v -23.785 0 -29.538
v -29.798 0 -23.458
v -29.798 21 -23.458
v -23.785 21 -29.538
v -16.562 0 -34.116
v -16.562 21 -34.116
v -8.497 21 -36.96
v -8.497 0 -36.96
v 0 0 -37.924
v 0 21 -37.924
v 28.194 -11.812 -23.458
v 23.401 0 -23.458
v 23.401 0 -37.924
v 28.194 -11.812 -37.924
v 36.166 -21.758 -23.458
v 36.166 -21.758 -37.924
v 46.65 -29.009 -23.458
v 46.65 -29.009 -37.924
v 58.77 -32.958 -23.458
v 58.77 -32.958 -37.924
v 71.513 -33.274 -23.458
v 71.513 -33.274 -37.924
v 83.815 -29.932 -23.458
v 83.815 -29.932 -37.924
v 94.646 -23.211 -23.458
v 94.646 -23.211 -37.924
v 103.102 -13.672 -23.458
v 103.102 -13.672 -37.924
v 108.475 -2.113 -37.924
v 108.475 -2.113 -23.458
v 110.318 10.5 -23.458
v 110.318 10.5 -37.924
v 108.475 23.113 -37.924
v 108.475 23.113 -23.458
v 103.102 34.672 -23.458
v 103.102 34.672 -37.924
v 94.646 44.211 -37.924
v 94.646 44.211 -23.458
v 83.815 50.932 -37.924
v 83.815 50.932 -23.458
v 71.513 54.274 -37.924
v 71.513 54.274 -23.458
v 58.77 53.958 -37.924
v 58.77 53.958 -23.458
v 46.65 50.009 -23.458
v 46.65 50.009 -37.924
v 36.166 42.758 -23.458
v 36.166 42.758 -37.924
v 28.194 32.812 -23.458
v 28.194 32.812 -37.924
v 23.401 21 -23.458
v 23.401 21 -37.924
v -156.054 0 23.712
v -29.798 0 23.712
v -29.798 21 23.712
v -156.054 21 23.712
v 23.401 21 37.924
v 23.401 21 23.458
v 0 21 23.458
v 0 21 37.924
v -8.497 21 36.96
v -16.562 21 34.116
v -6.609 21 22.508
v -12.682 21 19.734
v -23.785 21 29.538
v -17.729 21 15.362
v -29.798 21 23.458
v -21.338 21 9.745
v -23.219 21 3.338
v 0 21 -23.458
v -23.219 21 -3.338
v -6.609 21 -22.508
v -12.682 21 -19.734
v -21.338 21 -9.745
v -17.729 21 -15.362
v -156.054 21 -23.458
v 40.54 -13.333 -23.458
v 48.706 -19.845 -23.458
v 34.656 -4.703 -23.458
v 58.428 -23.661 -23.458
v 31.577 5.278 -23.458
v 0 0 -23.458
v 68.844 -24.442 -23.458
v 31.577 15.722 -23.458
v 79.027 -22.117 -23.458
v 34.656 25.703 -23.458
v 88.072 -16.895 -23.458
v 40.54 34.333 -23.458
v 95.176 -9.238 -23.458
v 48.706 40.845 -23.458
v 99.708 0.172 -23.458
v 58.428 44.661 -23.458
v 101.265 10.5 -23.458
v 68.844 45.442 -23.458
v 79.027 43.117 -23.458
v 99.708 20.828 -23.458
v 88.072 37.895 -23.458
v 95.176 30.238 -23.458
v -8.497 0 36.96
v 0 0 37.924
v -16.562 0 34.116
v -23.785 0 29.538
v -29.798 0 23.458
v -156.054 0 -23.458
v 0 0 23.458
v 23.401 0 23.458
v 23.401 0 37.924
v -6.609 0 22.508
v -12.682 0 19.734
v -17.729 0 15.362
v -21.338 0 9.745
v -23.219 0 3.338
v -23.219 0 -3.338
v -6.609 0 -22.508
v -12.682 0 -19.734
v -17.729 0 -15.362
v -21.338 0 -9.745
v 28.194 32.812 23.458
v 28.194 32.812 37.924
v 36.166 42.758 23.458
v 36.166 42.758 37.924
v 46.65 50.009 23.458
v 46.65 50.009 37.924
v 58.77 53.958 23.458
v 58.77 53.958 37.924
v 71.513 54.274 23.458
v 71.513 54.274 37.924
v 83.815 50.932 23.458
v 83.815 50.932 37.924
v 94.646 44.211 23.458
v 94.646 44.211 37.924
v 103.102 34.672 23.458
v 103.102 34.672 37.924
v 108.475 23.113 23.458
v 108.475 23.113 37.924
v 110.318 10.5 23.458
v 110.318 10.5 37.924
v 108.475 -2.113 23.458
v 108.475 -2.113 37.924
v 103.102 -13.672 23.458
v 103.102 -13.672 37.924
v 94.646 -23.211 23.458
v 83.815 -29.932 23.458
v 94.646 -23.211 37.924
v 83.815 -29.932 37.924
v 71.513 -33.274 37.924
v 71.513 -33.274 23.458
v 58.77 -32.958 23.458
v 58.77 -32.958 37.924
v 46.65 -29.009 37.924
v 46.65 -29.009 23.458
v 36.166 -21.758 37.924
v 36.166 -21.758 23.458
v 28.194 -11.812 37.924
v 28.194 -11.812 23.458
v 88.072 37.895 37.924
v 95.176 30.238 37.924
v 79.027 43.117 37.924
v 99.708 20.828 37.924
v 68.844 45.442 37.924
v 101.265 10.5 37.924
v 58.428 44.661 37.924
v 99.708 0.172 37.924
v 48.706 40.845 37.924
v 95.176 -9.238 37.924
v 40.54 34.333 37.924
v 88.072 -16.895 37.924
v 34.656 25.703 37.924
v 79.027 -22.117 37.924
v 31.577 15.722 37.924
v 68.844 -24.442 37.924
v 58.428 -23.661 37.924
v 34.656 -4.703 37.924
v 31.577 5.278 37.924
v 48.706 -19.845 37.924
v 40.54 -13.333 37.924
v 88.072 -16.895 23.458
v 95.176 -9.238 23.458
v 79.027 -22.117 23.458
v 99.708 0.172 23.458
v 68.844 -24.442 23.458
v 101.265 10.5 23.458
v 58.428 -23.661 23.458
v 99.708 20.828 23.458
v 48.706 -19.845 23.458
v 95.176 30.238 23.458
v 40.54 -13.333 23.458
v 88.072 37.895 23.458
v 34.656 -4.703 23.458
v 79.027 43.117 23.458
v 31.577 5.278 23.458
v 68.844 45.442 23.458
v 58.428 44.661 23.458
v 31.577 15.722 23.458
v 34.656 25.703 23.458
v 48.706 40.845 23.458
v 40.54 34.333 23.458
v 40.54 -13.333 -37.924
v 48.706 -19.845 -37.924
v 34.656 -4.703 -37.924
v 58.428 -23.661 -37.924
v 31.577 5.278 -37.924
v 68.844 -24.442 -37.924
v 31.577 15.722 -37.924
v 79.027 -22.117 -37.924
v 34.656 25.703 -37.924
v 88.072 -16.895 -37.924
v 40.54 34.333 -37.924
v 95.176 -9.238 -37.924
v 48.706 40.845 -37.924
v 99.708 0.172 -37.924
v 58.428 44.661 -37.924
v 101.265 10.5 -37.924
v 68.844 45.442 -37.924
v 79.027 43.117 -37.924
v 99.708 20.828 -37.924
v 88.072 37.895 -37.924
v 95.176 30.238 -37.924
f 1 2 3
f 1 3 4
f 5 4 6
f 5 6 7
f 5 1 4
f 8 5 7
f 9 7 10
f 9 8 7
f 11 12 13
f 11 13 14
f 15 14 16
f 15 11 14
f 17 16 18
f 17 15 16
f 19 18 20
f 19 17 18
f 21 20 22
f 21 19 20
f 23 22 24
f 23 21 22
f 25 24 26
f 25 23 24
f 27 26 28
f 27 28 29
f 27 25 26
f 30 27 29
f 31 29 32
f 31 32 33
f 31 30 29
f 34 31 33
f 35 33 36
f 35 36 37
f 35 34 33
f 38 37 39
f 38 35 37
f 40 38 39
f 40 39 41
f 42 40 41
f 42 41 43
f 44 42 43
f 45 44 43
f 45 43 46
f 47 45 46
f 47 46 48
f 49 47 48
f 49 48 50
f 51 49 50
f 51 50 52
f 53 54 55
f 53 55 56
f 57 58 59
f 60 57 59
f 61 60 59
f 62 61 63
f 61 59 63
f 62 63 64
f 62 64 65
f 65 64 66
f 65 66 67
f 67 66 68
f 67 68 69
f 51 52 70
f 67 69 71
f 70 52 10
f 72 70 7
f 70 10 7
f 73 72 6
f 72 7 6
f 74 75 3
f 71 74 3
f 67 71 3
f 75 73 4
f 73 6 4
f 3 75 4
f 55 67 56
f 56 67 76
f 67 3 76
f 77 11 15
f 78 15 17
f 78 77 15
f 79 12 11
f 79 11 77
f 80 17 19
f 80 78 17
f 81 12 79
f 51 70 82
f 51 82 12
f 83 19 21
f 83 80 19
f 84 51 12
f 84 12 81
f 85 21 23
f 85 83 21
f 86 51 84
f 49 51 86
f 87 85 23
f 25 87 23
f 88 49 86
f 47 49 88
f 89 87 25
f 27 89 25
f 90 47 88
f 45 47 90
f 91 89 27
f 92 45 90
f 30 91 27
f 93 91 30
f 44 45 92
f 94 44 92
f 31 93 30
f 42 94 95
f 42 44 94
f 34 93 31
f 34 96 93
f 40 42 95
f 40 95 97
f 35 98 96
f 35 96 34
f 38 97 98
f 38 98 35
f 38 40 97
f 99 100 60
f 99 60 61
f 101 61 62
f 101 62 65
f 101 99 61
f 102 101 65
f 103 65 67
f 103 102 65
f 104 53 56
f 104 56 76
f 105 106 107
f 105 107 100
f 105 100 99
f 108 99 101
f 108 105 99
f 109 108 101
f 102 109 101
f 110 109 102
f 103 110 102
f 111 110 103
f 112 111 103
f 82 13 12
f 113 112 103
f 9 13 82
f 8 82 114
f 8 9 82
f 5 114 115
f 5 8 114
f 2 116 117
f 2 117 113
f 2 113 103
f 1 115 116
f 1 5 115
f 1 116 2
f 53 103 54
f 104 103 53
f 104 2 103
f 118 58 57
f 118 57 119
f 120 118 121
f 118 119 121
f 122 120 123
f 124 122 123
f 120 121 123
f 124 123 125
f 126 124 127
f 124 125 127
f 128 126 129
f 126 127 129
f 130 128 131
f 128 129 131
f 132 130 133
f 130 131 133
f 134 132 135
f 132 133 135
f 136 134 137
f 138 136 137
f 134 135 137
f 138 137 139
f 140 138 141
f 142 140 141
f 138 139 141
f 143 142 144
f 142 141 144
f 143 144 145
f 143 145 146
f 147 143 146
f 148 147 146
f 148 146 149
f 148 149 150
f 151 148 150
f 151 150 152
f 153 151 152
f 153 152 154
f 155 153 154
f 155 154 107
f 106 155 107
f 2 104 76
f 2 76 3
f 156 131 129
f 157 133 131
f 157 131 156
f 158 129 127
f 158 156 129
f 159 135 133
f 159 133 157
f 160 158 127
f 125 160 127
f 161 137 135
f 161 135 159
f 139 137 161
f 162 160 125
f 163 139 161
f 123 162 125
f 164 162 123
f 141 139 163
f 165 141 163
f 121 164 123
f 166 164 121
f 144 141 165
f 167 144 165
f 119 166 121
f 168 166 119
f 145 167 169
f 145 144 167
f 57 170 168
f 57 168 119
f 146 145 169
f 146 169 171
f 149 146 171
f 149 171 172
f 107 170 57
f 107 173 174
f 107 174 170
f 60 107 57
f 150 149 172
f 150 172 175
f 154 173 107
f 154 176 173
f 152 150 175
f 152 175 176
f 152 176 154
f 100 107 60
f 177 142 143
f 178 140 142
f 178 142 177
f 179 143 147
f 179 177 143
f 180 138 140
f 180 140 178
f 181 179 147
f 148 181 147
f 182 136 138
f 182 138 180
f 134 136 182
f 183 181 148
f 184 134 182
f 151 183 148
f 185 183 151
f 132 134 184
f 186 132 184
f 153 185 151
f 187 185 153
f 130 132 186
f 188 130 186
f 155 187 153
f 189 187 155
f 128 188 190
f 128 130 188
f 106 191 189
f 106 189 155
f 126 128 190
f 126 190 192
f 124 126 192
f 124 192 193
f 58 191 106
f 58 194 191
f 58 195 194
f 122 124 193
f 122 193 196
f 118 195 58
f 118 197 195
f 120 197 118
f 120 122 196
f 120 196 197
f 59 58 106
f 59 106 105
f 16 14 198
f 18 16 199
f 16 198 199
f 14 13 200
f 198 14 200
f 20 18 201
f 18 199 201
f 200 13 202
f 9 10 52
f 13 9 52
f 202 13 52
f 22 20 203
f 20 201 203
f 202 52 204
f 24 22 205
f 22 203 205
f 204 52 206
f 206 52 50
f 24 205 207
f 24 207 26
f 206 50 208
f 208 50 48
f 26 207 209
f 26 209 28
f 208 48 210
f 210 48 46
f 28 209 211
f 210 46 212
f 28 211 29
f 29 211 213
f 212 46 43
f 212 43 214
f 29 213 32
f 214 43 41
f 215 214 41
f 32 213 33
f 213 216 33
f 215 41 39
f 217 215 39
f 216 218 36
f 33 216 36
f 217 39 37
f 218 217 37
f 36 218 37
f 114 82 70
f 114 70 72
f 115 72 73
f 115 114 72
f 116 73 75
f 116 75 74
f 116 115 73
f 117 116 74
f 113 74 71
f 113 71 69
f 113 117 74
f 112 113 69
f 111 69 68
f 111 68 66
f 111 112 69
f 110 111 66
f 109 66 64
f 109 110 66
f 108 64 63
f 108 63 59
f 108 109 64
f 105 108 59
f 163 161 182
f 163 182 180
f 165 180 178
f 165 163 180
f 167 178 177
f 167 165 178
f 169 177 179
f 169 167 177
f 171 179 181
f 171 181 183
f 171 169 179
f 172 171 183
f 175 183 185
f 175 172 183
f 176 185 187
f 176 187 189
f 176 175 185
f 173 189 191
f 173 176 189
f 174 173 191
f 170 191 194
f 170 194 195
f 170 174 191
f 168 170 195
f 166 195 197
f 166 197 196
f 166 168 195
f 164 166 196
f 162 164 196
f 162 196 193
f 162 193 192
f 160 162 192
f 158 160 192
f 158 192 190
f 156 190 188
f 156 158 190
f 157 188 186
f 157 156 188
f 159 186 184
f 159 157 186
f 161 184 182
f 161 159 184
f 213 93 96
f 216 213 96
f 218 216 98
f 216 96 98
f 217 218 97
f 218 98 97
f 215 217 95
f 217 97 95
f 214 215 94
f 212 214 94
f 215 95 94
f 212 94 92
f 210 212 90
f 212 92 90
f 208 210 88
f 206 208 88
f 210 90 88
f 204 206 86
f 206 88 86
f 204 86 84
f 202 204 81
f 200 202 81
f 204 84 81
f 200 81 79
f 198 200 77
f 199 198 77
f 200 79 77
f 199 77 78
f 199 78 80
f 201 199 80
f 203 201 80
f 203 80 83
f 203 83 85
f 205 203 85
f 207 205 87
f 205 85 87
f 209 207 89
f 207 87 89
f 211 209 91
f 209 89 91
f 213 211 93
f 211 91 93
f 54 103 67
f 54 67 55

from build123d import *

# Parameters (mm, degrees)
BOSS_EXTRUDE1_DEPTH = 21
SKETCH2_R           = 44.092659675
SKETCH2_R_2         = 35.039506693
BOSS_EXTRUDE2_DEPTH = 14.465745569
BOSS_EXTRUDE3_START = -14.465745569
SKETCH4_R           = 44.092659675
SKETCH4_R_2         = 35.039506693
BOSS_EXTRUDE3_DEPTH = 14.465745569


with BuildPart() as part:
    # Sketch1 → Boss-Extrude1 (new body)
    with BuildSketch(Plane(origin=(0, 0, 0), x_dir=(1, 0, 0), z_dir=(0, 1, 0))):
        with BuildLine():
            Line((0, 37.924000209), (23.712323124, 37.924000209))
            Line((23.712323124, 37.924000209), (23.712323124, 23.45825464))
            Line((23.712323124, 23.45825464), (0, 23.45825464))
            ThreePointArc((0, 23.45825464), (-23.45825464, 0), (0, -23.45825464))
            Line((0, -23.45825464), (23.712323124, -23.45825464))
            Line((23.712323124, -23.45825464), (23.712323124, -37.924000209))
            Line((23.712323124, -37.924000209), (0, -37.924000209))
            ThreePointArc((0, -37.924000209), (-16.561988679, -34.116423067), (-29.798323461, -23.45825464))
            Line((-29.798323461, -23.45825464), (-29.798323461, -23.712323124))
            Line((-29.798323461, -23.712323124), (-156.054398777, -23.712323124))
            Line((-156.054398777, -23.712323124), (-156.054398777, 23.45825464))
            Line((-156.054398777, 23.45825464), (-29.798323461, 23.45825464))
            ThreePointArc((-29.798323461, 23.45825464), (-16.561988679, 34.116423067), (0, 37.924000209))
        make_face()
    extrude(amount=BOSS_EXTRUDE1_DEPTH)

    # Sketch2 → Boss-Extrude2 (add)
    with BuildSketch(Plane.XY.offset(-23.45825464)):
        with Locations((66.225280873, 10.5)):
            Circle(SKETCH2_R)
        with Locations((66.225280873, 10.5)):
            Circle(SKETCH2_R_2, mode=Mode.SUBTRACT)
    extrude(amount=-BOSS_EXTRUDE2_DEPTH)

    # Sketch4 → Boss-Extrude3 (add)
    with BuildSketch(Plane(origin=(0, 0, 23.45825464), x_dir=(-1, 0, 0), z_dir=(0, 0, -1)).offset(BOSS_EXTRUDE3_START)):
        with Locations((-66.225280873, 10.5)):
            Circle(SKETCH4_R)
        with Locations(Location((-66.225280873, 10.5, 0), (0, 0, 180))):
            Circle(SKETCH4_R_2, mode=Mode.SUBTRACT)
    extrude(amount=BOSS_EXTRUDE3_DEPTH)


solid = part.part
